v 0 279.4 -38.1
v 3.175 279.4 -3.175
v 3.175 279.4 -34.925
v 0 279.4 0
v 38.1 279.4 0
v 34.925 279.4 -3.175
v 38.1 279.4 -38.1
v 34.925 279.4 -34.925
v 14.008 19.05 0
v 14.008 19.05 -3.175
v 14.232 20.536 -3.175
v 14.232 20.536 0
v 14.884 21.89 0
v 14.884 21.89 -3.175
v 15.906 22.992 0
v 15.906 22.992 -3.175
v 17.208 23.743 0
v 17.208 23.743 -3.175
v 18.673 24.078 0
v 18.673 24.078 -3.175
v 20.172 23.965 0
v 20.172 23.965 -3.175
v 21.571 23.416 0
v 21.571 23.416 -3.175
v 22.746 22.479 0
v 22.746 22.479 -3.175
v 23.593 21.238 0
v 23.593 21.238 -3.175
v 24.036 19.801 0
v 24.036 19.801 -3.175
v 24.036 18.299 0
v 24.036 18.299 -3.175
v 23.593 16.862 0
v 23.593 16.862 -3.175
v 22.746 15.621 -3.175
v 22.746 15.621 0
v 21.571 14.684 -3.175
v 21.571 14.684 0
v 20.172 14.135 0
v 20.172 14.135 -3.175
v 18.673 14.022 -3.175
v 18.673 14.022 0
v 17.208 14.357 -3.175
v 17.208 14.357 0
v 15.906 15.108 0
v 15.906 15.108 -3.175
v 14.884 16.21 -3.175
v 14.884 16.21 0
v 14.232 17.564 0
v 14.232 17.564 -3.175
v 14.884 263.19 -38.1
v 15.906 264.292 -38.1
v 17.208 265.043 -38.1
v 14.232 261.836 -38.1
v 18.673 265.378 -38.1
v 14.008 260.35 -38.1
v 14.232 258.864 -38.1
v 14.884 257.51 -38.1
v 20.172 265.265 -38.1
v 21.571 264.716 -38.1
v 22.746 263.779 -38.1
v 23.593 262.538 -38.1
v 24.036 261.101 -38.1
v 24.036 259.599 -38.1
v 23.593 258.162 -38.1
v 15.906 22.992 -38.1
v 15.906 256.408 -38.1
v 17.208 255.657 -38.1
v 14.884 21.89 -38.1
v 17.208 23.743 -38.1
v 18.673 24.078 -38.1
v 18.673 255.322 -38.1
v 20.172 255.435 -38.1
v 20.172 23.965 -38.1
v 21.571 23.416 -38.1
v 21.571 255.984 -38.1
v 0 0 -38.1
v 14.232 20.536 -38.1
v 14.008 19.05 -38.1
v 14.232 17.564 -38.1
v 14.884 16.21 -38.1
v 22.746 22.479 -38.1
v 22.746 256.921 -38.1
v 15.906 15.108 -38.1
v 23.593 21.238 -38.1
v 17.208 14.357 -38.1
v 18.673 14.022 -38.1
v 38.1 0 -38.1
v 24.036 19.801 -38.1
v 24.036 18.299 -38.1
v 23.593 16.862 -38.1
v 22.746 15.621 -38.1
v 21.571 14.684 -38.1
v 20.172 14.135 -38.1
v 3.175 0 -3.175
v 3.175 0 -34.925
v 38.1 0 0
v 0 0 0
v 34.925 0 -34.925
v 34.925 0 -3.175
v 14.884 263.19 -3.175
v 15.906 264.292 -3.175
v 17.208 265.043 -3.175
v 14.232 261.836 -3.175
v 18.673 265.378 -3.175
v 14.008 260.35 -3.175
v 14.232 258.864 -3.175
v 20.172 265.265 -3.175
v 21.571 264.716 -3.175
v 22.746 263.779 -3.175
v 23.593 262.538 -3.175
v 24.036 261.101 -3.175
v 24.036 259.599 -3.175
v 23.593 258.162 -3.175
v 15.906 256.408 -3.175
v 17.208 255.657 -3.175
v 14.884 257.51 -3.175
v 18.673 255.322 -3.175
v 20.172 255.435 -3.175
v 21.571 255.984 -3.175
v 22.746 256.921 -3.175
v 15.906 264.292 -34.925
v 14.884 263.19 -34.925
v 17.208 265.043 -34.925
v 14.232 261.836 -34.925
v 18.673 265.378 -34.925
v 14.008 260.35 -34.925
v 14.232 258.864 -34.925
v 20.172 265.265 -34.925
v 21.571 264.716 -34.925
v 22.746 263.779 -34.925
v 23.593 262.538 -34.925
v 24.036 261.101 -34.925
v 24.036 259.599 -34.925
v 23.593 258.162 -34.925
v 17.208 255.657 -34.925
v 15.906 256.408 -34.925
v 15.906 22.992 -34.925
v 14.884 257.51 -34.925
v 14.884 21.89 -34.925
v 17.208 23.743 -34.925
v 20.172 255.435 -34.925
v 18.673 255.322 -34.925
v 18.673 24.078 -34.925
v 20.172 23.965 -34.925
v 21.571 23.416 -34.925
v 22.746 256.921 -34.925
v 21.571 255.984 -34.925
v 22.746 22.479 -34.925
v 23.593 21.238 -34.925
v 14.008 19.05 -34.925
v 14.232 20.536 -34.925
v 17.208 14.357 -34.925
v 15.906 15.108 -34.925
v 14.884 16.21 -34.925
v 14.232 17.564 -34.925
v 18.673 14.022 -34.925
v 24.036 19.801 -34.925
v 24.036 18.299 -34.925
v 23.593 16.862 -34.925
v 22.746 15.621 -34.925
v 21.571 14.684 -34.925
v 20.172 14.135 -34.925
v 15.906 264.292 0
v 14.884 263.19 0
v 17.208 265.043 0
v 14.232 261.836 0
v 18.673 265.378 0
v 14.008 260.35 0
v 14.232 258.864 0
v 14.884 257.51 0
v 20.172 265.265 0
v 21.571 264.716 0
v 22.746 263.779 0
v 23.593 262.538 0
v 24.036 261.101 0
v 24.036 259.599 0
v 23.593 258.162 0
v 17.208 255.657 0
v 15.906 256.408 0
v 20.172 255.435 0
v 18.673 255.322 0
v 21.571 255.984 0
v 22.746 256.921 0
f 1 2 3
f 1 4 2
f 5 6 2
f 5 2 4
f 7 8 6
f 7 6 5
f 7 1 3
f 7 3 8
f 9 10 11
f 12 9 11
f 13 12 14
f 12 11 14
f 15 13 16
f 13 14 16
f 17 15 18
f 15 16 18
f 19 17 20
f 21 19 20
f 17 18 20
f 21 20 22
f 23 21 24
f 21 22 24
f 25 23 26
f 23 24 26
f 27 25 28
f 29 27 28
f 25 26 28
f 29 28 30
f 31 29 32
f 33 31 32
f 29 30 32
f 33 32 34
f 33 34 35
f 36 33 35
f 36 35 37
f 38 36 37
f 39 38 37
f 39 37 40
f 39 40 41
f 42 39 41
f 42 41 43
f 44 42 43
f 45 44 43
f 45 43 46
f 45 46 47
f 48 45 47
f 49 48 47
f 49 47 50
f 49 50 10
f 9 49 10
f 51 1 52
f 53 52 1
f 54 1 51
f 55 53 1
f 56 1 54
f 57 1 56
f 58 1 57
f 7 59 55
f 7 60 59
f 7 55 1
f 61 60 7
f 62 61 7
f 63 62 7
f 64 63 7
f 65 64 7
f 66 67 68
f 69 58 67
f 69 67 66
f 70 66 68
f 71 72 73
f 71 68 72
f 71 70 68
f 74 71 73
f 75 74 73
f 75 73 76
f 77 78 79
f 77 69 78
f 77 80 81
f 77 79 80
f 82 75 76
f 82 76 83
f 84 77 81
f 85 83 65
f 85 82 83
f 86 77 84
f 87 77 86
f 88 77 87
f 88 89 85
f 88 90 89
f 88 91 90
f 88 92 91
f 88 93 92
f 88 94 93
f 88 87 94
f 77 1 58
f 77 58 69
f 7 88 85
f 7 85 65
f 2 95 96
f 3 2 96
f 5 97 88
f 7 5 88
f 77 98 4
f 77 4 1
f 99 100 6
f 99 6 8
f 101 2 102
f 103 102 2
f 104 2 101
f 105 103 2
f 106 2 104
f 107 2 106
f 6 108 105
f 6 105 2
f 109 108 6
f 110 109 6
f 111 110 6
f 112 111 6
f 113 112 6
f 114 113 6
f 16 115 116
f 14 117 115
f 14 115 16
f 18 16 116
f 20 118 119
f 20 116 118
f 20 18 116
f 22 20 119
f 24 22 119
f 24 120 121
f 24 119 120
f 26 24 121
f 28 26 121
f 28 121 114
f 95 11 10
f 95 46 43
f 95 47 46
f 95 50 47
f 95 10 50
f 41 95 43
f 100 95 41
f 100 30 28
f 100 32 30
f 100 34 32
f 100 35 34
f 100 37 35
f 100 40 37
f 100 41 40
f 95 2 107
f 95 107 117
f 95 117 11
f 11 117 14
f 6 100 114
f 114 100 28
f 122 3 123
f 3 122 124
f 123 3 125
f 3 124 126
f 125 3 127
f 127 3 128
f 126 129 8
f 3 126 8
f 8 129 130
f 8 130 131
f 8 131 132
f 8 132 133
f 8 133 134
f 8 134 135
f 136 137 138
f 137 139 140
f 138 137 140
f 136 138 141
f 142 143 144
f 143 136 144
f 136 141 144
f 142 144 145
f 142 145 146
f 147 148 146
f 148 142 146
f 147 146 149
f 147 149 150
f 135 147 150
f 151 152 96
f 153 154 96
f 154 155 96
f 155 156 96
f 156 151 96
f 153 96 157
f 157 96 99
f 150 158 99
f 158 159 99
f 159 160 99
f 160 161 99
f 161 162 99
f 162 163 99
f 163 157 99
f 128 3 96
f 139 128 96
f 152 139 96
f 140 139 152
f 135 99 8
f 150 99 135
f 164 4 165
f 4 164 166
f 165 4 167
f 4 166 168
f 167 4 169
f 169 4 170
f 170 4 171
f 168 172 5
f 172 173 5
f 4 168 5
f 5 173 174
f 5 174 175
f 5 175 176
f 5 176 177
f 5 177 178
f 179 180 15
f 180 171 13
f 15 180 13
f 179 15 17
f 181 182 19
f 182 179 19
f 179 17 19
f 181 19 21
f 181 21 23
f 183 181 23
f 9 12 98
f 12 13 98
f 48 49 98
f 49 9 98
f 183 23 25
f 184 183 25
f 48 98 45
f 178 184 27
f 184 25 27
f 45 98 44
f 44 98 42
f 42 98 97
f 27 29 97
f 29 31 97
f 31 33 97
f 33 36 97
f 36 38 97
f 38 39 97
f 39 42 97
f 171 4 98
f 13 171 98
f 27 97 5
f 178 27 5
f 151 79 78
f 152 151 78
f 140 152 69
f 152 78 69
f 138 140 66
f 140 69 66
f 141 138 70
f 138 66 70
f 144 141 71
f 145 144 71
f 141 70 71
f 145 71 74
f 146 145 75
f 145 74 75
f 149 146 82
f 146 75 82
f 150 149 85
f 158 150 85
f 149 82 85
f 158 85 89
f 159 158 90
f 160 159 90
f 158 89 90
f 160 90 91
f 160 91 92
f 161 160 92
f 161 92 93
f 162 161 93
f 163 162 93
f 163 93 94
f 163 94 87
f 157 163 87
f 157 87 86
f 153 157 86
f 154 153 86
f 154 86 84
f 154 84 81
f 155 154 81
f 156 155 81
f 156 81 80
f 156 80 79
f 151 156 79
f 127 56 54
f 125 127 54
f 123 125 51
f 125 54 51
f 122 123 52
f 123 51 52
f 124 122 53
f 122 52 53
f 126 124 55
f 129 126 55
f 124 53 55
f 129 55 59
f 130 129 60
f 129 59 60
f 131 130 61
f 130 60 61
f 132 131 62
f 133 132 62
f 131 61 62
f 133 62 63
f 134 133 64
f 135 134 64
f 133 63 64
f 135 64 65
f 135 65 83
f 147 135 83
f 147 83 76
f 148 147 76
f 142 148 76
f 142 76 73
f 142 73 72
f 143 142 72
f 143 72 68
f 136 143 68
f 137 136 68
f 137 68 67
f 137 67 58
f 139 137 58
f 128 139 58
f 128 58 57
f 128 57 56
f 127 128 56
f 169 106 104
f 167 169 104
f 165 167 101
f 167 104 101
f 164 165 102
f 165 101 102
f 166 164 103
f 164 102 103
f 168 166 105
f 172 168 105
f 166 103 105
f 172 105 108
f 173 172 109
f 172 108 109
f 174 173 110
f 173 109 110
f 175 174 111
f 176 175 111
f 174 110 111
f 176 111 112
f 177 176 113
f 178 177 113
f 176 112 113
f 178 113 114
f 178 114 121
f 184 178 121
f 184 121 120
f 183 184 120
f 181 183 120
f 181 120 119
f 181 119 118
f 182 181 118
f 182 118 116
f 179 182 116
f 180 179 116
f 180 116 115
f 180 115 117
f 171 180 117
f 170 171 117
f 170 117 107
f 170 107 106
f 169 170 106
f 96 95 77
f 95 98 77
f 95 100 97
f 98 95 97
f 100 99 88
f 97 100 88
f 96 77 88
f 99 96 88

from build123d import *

# Parameters (mm, degrees)
SKETCH1_W                = 38.1
SKETCH1_H                = 38.1
SKETCH1_W_2              = 31.75
SKETCH1_H_2              = 31.75
BOSS_EXTRUDE1_DEPTH      = 279.4
X_0_397_DIAMETER_HOLE1_D = 10.0838


with BuildPart() as part:
    # Sketch1 → Boss-Extrude1 (new body)
    with BuildSketch(Plane(origin=(0, 0, 0), x_dir=(1, 0, 0), z_dir=(0, 1, 0))):
        with Locations((19.05, 19.05)):
            Rectangle(SKETCH1_W, SKETCH1_H)
        with Locations((19.05, 19.05)):
            Rectangle(SKETCH1_W_2, SKETCH1_H_2, mode=Mode.SUBTRACT)
    extrude(amount=BOSS_EXTRUDE1_DEPTH)

    # X (0.397) Diameter Hole1 (through all)
    with Locations(Plane.XY):
        with Locations((19.05, 260.35), (19.05, 19.05)):
            Hole(X_0_397_DIAMETER_HOLE1_D / 2)


solid = part.part
